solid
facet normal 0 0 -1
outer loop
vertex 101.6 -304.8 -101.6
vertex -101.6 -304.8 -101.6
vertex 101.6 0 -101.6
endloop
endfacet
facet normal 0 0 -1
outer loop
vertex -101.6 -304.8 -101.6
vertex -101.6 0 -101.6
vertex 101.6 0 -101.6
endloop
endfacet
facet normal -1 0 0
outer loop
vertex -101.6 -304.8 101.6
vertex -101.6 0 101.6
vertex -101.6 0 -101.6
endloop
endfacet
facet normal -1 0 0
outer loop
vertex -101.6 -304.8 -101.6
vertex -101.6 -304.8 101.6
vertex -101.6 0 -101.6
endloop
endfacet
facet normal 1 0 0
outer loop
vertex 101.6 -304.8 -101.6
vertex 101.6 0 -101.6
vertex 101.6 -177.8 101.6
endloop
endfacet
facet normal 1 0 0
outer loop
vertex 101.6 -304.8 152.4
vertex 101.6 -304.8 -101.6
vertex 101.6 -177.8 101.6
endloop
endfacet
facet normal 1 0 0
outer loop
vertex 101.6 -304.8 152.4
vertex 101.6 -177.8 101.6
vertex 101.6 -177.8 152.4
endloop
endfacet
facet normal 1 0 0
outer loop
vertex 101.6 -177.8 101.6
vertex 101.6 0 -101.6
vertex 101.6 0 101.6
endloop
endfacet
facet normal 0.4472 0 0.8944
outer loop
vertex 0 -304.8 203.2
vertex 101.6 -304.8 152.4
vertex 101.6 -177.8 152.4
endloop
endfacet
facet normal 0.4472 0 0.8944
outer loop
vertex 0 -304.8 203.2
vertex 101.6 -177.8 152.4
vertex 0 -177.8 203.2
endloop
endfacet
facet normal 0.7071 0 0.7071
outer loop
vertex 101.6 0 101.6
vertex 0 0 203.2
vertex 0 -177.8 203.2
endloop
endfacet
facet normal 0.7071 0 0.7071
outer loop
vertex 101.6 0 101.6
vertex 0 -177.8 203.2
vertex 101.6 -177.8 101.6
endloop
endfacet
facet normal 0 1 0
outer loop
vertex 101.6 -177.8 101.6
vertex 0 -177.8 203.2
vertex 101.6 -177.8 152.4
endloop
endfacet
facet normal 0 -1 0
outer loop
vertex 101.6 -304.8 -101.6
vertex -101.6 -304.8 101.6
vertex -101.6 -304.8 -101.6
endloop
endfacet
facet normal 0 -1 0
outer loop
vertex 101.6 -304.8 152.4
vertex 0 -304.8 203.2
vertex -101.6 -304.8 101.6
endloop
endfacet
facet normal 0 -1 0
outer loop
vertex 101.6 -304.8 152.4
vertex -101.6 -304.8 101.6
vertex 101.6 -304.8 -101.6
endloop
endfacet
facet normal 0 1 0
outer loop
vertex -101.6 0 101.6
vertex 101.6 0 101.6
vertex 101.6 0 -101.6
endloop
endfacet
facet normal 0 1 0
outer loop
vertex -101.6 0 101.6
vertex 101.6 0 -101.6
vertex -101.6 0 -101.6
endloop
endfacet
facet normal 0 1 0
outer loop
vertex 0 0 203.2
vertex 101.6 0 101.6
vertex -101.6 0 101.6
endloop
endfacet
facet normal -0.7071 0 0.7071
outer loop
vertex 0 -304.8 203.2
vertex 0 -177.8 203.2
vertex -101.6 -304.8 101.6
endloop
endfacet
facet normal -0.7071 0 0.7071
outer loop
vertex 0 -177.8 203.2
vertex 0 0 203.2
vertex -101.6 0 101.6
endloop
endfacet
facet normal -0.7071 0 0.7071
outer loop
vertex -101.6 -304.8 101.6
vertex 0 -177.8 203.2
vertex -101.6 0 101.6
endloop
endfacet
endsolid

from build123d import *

# Parameters (mm, degrees)
F0_W     = 203.2
F0_H     = 203.2
F1_DEPTH = 177.8
F3_DEPTH = 177.8
F4_W     = 203.2
F4_H     = 152.4
F5_DEPTH = 127
F6_DEPTH = 127


with BuildPart() as f1:
    # F0 (on Front) → F1 (new body)
    with BuildSketch(Plane.XZ):
        Rectangle(F0_W, F0_H)
    extrude(amount=F1_DEPTH)

    # F2 (on face) → F3 (join)
    with BuildSketch(Plane(origin=(0, 0, 0), x_dir=(-1, 0, 0), z_dir=(0, 1, 0))):
        Polygon((0, 203.2), (-101.6, 101.6), (101.6, 101.6), align=None)
    extrude(amount=-F3_DEPTH)

    # F4 (on face) → F5 (join)
    with BuildSketch(Plane.XZ.offset(177.8)):
        with Locations((0, -25.4)):
            Rectangle(F4_W, F4_H)
    extrude(amount=F5_DEPTH)

    # F4 (on face) → F6 (join)
    with BuildSketch(Plane.XZ.offset(177.8)):
        Polygon((-101.6, 101.6), (-101.6, 50.8), (101.6, 50.8), (101.6, 101.6), (0, 203.2), align=None)
        Polygon((0, 203.2), (101.6, 101.6), (101.6, 152.4), align=None)
    extrude(amount=F6_DEPTH)


solid = f1.part
